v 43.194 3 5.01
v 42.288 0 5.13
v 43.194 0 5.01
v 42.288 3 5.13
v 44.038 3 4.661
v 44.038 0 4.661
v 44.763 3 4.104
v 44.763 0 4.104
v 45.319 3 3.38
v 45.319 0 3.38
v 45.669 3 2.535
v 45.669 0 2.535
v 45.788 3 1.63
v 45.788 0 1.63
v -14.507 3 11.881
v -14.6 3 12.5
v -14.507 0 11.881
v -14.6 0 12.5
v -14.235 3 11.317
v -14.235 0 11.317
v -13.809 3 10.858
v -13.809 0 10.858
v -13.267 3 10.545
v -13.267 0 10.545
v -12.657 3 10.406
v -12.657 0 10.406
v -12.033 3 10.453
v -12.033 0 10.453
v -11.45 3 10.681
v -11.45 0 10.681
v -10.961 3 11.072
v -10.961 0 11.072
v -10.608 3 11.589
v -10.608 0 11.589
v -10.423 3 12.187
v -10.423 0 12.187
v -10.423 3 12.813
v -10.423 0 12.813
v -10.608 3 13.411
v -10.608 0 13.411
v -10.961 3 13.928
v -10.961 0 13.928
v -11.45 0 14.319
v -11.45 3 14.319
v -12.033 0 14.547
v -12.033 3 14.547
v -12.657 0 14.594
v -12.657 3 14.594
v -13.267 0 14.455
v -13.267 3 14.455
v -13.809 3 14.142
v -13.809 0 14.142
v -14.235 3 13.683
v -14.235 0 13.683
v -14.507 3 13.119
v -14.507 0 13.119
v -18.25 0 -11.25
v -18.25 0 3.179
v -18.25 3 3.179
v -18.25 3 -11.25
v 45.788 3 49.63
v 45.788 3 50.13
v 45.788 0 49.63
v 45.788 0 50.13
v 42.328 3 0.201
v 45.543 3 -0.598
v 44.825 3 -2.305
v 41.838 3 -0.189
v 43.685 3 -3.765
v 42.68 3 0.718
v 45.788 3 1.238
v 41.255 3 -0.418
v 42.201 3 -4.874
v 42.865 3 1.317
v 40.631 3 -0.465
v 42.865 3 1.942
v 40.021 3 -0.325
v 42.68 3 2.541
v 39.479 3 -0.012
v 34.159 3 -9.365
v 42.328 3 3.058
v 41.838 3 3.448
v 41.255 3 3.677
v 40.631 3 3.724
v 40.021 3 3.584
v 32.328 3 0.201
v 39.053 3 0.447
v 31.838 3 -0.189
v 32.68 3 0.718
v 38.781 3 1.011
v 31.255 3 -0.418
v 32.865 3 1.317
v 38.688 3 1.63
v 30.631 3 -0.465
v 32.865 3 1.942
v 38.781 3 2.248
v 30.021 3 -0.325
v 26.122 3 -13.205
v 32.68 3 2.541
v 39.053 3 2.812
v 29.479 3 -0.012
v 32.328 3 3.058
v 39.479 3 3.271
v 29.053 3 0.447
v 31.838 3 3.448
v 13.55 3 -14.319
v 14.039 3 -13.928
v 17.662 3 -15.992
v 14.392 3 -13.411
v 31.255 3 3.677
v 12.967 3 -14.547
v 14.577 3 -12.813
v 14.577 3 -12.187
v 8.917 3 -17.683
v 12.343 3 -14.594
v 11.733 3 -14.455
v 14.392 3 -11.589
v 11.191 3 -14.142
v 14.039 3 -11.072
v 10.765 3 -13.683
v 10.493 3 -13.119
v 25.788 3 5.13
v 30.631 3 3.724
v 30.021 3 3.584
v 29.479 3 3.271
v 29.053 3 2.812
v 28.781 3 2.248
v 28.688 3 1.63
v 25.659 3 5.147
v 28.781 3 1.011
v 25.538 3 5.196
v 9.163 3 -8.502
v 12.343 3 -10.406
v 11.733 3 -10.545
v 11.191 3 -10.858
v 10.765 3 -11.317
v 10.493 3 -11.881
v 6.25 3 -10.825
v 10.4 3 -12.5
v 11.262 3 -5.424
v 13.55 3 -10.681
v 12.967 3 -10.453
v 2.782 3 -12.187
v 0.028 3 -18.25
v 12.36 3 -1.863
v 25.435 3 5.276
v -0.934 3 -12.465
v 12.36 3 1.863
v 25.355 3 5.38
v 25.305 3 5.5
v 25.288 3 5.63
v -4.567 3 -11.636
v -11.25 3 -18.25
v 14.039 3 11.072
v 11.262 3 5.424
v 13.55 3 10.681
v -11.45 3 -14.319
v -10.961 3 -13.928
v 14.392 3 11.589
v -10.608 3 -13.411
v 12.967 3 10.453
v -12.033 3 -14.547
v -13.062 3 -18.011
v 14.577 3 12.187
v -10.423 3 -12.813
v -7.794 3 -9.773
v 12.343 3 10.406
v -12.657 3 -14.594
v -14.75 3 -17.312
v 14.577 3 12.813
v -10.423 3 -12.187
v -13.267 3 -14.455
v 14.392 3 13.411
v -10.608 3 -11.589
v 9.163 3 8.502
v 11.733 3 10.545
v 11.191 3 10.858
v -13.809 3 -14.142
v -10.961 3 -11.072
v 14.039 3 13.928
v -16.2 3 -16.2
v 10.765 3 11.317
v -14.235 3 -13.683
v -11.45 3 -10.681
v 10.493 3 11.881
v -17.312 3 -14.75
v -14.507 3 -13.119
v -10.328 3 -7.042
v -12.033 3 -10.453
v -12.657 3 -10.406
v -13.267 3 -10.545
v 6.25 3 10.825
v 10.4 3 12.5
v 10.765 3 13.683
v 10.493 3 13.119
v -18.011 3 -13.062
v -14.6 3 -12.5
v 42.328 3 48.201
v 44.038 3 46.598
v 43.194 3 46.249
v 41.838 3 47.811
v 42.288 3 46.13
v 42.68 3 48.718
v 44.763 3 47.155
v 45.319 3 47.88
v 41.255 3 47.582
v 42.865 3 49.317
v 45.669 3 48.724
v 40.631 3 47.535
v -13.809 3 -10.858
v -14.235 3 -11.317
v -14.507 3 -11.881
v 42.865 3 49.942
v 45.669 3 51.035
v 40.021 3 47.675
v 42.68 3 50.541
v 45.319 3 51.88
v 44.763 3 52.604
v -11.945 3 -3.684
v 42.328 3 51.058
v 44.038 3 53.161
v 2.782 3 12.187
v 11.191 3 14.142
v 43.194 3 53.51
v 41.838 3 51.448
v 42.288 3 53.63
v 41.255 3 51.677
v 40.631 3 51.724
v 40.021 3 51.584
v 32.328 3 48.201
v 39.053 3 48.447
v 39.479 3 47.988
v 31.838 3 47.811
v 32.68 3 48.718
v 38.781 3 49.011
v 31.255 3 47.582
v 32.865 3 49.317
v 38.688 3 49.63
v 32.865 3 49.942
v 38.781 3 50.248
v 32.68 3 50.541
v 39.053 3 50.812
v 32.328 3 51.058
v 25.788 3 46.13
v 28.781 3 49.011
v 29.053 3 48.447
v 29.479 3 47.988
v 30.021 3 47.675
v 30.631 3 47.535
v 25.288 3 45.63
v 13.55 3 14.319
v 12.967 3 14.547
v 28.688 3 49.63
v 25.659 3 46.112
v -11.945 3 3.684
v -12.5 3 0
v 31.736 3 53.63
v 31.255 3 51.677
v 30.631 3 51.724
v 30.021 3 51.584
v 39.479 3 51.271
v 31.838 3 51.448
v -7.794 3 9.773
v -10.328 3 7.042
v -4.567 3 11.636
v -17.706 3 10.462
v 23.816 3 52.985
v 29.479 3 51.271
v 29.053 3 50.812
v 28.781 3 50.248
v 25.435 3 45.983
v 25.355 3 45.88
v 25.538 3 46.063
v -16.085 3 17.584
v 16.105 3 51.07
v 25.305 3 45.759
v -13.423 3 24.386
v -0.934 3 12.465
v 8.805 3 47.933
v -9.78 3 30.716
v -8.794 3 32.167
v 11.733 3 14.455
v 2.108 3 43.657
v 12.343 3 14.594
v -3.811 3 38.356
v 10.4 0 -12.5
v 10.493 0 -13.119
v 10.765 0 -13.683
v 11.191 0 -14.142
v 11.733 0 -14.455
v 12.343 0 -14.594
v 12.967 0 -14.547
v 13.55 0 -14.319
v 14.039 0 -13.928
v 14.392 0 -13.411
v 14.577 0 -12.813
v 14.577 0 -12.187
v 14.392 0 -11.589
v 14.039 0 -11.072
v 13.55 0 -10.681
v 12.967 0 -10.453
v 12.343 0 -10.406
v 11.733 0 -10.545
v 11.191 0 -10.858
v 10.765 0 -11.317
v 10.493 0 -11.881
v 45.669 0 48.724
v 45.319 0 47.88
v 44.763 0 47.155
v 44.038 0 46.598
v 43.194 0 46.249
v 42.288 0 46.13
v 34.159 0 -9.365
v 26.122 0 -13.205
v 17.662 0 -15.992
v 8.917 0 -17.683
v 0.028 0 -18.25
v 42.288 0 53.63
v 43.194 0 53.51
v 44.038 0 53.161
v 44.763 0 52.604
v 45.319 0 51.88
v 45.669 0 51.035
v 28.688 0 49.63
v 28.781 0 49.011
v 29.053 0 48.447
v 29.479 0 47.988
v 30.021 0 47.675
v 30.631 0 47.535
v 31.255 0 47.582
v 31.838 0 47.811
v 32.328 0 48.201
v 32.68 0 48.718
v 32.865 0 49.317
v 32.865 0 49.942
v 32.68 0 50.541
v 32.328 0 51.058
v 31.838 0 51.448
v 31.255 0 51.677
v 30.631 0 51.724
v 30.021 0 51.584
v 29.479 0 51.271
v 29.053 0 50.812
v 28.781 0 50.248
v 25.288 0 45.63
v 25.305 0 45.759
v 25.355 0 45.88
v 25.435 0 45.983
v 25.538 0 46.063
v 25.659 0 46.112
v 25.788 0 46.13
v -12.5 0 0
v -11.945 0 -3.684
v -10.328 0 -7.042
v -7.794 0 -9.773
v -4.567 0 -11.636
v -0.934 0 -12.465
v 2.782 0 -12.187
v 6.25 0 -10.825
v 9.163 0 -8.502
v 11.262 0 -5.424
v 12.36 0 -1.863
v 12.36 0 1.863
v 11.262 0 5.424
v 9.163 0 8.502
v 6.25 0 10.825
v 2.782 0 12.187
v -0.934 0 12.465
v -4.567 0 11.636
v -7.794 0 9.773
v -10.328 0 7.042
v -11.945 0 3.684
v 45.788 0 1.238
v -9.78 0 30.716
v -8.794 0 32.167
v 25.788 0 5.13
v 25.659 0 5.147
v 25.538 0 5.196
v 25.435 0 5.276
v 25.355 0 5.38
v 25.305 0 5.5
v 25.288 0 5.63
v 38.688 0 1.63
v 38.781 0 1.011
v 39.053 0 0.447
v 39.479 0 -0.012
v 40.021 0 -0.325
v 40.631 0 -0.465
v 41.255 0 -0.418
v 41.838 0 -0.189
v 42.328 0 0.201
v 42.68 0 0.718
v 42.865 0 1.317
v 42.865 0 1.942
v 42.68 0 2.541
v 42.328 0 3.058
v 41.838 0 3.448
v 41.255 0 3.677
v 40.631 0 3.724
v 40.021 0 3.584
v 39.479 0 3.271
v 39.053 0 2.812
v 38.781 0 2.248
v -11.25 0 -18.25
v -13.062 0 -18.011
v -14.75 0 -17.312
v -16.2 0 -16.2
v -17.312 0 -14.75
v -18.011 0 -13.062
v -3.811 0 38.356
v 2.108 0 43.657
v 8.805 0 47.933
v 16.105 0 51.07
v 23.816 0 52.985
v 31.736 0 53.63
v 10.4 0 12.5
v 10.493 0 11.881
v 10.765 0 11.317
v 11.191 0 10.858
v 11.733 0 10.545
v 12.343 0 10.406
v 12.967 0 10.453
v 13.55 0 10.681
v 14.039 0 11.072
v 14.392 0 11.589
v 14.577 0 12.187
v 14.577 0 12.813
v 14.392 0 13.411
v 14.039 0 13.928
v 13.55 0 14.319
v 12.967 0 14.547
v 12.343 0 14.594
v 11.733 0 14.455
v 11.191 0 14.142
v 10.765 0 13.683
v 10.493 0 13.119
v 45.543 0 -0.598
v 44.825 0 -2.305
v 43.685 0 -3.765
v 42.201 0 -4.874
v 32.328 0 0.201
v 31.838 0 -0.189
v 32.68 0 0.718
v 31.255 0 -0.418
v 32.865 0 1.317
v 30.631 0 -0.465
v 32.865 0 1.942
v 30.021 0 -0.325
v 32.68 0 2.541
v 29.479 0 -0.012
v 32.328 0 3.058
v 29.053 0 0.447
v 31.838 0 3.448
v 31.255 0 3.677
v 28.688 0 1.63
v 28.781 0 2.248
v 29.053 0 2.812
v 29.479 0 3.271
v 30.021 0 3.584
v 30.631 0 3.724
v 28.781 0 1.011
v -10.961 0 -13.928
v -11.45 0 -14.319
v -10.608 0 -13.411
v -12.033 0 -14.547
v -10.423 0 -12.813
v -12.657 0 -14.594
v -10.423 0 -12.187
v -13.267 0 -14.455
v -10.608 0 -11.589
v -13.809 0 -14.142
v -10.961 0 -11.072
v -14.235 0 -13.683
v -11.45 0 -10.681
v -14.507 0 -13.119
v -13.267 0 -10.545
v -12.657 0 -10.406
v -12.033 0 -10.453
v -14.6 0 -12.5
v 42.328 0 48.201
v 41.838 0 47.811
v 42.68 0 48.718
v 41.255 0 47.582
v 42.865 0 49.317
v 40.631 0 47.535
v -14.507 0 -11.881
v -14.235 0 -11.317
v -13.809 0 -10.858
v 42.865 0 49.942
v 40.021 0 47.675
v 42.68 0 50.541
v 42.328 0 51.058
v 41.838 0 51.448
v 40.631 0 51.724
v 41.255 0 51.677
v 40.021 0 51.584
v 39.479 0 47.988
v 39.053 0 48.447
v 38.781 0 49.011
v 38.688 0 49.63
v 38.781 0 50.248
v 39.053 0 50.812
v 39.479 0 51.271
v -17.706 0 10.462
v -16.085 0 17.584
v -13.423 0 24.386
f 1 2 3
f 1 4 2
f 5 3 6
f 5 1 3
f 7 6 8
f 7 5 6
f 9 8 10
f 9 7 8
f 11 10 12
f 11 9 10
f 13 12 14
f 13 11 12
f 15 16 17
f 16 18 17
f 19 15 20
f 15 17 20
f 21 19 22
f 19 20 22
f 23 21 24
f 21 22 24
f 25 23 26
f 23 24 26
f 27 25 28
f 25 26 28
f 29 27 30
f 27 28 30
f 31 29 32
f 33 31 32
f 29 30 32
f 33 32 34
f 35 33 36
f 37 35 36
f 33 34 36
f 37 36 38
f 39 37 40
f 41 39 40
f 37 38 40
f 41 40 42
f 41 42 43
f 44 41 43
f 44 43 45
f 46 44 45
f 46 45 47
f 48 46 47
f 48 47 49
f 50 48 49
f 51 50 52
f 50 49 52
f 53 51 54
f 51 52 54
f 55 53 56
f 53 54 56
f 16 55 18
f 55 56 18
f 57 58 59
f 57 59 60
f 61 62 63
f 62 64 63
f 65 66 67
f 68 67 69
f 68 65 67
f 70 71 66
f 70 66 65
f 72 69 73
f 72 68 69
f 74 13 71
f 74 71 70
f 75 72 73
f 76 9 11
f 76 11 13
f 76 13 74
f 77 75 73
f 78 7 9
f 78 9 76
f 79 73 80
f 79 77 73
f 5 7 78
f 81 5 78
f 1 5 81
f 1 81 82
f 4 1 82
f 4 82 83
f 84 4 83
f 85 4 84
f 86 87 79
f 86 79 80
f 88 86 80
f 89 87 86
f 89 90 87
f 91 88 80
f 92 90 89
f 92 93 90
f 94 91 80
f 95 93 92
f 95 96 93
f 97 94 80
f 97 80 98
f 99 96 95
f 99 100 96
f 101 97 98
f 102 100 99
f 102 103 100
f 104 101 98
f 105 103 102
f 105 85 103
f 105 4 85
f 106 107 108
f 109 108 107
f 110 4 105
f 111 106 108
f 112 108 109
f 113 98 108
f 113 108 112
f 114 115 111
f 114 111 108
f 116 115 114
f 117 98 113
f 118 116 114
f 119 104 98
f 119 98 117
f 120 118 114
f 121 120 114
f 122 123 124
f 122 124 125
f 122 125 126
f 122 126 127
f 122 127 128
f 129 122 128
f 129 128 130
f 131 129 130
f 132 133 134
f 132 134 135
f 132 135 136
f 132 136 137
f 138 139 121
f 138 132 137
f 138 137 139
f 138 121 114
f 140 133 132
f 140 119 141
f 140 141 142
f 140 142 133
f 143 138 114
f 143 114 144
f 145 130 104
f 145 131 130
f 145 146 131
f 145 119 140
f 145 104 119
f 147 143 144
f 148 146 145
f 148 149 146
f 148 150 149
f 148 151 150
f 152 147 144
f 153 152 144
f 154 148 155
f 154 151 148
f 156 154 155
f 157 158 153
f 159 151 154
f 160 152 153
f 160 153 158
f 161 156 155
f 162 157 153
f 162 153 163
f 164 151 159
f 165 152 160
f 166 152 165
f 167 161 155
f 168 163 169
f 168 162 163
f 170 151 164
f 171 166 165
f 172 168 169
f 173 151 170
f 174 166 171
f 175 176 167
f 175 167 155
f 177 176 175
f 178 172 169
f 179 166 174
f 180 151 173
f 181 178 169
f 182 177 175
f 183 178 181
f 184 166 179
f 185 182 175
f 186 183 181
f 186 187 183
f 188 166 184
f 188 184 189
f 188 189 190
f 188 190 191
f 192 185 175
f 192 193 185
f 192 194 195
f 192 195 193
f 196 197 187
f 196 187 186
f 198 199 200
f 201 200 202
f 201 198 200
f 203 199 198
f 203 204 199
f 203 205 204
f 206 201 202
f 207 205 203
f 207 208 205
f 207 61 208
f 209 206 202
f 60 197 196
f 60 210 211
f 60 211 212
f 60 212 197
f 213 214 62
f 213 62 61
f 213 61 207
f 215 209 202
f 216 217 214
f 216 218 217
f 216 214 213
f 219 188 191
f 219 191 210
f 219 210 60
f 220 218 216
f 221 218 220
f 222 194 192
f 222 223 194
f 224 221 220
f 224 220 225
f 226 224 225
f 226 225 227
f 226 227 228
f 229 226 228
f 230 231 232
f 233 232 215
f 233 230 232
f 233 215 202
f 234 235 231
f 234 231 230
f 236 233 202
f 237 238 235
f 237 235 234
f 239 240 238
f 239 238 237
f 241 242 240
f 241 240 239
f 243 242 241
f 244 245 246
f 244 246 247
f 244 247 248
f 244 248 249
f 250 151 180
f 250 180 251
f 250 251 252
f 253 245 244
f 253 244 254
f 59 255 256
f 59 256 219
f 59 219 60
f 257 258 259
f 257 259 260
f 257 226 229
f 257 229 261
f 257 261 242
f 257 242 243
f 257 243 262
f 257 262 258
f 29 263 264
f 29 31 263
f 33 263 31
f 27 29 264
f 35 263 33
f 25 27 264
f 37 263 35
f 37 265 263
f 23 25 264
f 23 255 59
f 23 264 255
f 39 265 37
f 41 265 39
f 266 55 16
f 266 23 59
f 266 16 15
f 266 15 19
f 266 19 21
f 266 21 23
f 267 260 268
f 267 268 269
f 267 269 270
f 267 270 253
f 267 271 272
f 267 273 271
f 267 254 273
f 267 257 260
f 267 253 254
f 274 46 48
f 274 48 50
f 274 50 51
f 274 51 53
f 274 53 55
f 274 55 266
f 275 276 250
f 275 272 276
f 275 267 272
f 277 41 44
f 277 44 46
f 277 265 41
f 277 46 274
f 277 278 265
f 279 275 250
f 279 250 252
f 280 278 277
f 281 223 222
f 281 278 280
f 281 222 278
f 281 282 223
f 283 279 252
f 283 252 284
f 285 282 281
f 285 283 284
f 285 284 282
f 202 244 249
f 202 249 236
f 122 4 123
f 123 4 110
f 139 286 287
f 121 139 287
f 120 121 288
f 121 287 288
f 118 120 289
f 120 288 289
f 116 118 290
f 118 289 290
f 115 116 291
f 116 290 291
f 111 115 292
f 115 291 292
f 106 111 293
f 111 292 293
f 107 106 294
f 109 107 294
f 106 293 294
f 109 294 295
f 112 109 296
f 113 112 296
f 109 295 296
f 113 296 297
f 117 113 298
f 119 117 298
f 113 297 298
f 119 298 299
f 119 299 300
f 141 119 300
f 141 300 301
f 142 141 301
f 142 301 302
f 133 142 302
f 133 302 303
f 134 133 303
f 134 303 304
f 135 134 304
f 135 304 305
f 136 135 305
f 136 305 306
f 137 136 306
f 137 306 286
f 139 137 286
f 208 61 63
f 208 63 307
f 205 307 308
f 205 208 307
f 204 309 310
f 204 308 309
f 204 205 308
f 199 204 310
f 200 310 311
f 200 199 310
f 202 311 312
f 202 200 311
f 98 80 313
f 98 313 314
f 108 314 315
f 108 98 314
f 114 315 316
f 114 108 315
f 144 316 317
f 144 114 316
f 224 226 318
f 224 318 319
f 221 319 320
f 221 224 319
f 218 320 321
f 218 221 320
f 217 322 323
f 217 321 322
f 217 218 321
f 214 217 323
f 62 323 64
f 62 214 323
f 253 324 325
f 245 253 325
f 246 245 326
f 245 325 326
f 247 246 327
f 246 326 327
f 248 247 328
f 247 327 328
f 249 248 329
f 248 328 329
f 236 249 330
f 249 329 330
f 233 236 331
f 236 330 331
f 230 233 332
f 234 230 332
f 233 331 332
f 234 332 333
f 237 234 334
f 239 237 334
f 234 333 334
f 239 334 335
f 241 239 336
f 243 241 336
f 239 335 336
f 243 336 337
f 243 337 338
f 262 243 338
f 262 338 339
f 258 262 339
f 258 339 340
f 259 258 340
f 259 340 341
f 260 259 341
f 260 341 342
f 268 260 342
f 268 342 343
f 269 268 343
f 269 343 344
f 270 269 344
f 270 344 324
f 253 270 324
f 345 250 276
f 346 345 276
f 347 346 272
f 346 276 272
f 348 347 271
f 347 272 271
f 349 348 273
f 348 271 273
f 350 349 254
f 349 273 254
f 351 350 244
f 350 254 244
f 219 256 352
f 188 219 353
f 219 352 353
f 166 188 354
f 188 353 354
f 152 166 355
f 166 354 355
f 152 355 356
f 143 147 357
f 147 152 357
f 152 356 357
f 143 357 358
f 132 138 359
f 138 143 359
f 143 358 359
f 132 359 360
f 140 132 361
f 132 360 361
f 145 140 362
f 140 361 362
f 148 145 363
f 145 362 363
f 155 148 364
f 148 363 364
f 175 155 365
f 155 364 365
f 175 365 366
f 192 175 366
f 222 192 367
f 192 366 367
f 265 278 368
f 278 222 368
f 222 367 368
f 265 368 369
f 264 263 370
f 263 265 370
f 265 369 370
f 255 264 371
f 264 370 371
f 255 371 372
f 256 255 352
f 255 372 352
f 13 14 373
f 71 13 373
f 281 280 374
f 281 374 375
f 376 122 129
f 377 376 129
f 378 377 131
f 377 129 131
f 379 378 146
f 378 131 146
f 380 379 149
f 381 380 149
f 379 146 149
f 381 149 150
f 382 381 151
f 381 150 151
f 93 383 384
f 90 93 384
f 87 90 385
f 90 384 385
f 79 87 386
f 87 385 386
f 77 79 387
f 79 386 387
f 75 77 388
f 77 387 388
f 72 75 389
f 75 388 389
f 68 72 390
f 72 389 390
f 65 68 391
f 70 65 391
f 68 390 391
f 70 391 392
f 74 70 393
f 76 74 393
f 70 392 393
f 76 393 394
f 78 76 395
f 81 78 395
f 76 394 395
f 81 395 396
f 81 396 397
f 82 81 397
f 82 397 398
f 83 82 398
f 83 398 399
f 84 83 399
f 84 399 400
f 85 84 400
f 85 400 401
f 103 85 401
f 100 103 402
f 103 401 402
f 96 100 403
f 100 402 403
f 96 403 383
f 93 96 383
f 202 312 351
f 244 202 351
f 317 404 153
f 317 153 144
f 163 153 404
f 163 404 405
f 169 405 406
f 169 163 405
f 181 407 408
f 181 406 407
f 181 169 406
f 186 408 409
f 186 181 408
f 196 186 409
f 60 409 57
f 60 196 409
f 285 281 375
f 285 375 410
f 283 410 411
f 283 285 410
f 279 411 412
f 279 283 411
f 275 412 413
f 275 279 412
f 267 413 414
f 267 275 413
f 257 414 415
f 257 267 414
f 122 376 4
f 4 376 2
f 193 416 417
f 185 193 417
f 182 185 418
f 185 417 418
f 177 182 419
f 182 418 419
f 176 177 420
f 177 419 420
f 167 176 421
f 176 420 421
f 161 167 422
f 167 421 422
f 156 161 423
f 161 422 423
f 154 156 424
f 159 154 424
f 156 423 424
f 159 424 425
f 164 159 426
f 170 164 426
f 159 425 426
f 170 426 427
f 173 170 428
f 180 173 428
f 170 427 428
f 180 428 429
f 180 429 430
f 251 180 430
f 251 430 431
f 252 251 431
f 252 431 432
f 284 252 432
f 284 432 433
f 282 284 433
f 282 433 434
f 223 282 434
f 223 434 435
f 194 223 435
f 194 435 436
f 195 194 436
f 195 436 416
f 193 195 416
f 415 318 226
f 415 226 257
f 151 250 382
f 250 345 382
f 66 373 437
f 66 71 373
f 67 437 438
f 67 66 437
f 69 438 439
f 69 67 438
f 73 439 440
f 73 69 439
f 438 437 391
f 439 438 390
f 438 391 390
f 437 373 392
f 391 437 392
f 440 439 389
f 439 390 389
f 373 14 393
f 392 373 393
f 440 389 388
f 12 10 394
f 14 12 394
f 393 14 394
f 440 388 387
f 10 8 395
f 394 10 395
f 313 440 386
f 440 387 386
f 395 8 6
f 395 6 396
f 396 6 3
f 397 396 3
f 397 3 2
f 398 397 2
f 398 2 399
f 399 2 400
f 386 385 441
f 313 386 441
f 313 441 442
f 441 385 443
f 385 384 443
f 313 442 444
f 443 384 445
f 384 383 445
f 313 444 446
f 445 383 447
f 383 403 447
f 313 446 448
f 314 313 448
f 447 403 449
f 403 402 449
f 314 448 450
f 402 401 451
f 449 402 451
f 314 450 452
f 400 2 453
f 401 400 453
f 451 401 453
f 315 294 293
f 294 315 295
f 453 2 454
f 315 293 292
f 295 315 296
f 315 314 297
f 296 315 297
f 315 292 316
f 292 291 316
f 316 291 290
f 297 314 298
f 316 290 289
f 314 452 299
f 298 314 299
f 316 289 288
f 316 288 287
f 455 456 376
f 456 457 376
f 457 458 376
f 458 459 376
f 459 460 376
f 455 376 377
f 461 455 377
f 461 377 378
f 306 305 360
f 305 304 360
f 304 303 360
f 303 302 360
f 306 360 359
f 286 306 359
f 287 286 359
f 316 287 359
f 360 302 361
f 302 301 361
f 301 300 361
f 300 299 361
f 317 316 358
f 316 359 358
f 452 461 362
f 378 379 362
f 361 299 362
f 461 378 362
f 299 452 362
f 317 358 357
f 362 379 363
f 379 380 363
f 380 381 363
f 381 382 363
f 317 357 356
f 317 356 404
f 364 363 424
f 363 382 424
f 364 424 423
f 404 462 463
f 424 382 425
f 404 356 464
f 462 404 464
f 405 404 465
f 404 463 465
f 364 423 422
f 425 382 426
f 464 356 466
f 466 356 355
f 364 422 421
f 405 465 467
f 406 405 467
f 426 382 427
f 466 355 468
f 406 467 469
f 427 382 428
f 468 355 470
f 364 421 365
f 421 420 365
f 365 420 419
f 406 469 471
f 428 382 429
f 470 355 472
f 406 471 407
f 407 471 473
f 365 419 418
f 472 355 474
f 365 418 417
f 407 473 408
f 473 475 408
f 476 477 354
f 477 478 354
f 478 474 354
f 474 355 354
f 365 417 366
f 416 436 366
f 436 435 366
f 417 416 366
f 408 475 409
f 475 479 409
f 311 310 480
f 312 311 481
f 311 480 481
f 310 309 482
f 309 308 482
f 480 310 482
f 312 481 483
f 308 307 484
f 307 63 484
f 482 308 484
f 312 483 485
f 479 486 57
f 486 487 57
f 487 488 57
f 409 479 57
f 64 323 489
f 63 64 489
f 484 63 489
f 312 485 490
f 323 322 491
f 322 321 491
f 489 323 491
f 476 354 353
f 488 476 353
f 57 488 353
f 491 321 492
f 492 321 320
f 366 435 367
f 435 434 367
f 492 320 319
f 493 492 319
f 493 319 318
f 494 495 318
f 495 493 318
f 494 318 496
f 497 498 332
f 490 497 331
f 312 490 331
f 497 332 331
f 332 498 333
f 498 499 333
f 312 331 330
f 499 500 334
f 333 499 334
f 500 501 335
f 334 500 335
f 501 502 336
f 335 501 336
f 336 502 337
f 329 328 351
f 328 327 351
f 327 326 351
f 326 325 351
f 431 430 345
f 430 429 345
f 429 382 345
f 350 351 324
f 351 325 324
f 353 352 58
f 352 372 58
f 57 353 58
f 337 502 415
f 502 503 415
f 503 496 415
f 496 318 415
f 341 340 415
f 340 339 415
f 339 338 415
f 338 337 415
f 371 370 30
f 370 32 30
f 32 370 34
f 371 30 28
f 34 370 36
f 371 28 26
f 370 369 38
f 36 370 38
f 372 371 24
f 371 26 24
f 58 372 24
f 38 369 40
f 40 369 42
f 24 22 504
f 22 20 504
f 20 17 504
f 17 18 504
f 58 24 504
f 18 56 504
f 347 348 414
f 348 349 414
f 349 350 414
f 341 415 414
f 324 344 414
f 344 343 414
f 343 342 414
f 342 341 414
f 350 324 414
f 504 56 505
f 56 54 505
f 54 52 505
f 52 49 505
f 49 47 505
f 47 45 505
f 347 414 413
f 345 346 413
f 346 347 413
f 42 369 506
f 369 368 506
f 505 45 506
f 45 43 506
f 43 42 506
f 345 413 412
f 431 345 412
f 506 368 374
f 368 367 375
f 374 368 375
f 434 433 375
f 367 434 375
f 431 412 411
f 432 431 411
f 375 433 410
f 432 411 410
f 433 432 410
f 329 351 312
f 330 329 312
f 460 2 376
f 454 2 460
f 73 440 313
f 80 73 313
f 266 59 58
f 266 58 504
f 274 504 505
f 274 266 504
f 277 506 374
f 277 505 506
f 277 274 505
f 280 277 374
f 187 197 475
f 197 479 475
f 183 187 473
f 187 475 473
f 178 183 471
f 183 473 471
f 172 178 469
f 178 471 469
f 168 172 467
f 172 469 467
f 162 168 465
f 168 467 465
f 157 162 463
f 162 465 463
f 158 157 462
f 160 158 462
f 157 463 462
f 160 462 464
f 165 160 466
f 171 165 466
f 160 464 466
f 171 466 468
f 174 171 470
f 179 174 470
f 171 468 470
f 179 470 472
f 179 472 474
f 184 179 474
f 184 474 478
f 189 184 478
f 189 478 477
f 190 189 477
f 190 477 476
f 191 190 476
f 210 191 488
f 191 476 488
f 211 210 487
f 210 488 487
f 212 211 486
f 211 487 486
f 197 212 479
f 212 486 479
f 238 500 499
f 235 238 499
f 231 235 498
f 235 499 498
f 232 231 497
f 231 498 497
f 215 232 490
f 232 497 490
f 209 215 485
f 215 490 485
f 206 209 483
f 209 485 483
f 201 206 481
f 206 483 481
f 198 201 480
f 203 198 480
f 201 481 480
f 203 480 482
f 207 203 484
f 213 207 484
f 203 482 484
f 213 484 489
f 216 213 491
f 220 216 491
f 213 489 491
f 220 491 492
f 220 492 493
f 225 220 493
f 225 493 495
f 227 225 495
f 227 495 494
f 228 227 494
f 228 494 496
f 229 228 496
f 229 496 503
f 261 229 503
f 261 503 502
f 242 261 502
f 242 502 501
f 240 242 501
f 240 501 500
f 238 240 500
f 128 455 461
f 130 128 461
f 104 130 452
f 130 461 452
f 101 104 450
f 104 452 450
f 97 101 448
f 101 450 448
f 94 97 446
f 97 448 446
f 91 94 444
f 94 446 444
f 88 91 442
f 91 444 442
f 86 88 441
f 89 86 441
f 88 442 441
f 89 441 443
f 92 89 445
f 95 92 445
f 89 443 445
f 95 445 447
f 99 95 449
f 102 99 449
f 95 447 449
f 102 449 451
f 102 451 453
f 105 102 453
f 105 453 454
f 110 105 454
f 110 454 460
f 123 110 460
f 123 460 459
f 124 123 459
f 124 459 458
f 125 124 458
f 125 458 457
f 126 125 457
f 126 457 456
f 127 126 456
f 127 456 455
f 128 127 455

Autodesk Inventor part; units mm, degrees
ref_plane "YZ Plane" through (0, 0, 0) normal (1, 0, 0) x (0, 1, 0)
ref_plane "XZ Plane" through (0, 0, 0) normal (0, 1, 0) x (-1, 0, 0)
ref_plane "XY Plane" through (0, 0, 0) normal (0, 0, 1) x (1, 0, 0)
sketch "Szkic1" plane through (0, 0, 0) normal (0, 1, 0) x (-1, 0, 0)
  circle A0 centre (0, 0) radius 12.5
  line L0 (-12.5, 12.5) -> (12.5, 12.5)
  line L1 (12.5, 12.5) -> (12.5, -12.5)
  line L2 (12.5, -12.5) -> (-12.5, -12.5)
  line L3 (-12.5, -12.5) -> (-12.5, 12.5)
  line L4 (-12.5, 12.5) -> (12.5, -12.5) construction
  line L5 (12.5, 12.5) -> (-12.5, -12.5) construction
  circle A1 centre (12.5, -12.5) radius 2.1
  circle A2 centre (-12.5, -12.5) radius 2.1
  circle A3 centre (-12.5, 12.5) radius 2.1
  circle A4 centre (12.5, 12.5) radius 2.1
  circle A5 centre (0, 0) radius 50.5
  line L6 (-25, 3.4426) -> (25, 3.4426)
  line L7 (25, 3.4426) -> (25, -3.4426)
  line L8 (25, -3.4426) -> (-25, -3.4426)
  line L9 (-25, -3.4426) -> (-25, 3.4426)
  line L10 (-25, 3.4426) -> (25, -3.4426) construction
  line L11 (25, 3.4426) -> (-25, -3.4426) construction
  circle A6 centre (-35.7881, 35.6295) radius 3
  line L12 (-35.7881, 38.6295) -> (-35.7881, 45.6295)
  line L13 (-35.7881, 32.6295) -> (-35.7881, 5.6295)
  line L14 (-35.7881, 5.6295) -> (-35.7881, 25.6295)
  line L15 (-45.7881, 45.6295) -> (-25.7881, 45.6295)
  line L16 (-25.7881, 45.6295) -> (-25.7881, 5.6295)
  line L17 (-25.7881, 5.6295) -> (-45.7881, 5.6295)
  line L18 (-45.7881, 5.6295) -> (-45.7881, 45.6295)
  line L19 (-45.7881, 45.6295) -> (-25.7881, 5.6295) construction
  line L20 (-25.7881, 45.6295) -> (-45.7881, 5.6295) construction
  line L21 (-40.7881, 49.6295) -> (-30.7881, 49.6295)
  line L22 (-30.7881, 49.6295) -> (-30.7881, 1.6295)
  line L23 (-30.7881, 1.6295) -> (-40.7881, 1.6295)
  line L24 (-40.7881, 1.6295) -> (-40.7881, 49.6295)
  line L25 (-40.7881, 49.6295) -> (-30.7881, 1.6295) construction
  line L26 (-30.7881, 49.6295) -> (-40.7881, 1.6295) construction
  circle A7 centre (-30.7881, 1.6295) radius 2.1
  circle A8 centre (-40.7881, 1.6295) radius 2.1
  circle A9 centre (-40.7881, 49.6295) radius 2.1
  circle A10 centre (-30.7881, 49.6295) radius 2.1
  line L27 (-46.2881, 46.1295) -> (-25.2881, 46.1295)
  line L28 (-25.2881, 46.1295) -> (-25.2881, 5.1295)
  line L29 (-25.2881, 5.1295) -> (-46.2881, 5.1295)
  line L30 (-46.2881, 5.1295) -> (-46.2881, 46.1295)
  line L31 (-46.2881, 46.1295) -> (-25.2881, 5.1295) construction
  line L32 (-25.2881, 46.1295) -> (-46.2881, 5.1295) construction
  line L33 (-35.7881, 45.6295) -> (-35.7881, 53.6295)
  line L34 (-35.7881, 53.6295) -> (-45.7881, 53.6295)
  line L35 (-45.7881, 53.6295) -> (-45.7881, 46.1295)
  line L36 (-35.7881, 53.6295) -> (-5.7881, 53.6295)
  line L37 (-18.25, 18.25) -> (18.25, 18.25)
  line L38 (18.25, 18.25) -> (18.25, -18.25)
  line L39 (18.25, -18.25) -> (-18.25, -18.25)
  line L40 (-18.25, -18.25) -> (-18.25, 18.25)
  line L41 (-18.25, 18.25) -> (18.25, -18.25) construction
  line L42 (18.25, 18.25) -> (-18.25, -18.25) construction
  line L43 (18.25, 18.25) -> (-5.7881, 53.6295)
  line L44 (-45.7881, 5.1295) -> (-45.7881, -2.8705)
  line L45 (-45.7881, -2.8705) -> (-18.25, -18.25)
  dimension "d9" = 101
  dimension "d0" = 25
  dimension "d1" = 25
  dimension "d2" = 25
  dimension "d3" = 4.2
  dimension "d4" = 4.2
  dimension "d5" = 4.2
  dimension "d6" = 4.2
  dimension "d13" = 50
  dimension "d17" = 6
  dimension "d18" = 7
  dimension "d19" = 27
  dimension "d20" = 20
  dimension "d21" = 20
  dimension "d22" = 40
  dimension "d23" = 10
  dimension "d24" = 48
  dimension "d25" = 4.2
  dimension "d26" = 4.2
  dimension "d27" = 4.2
  dimension "d28" = 4.2
  dimension "d29" = 21
  dimension "d30" = 41
  dimension "d31" = 8
  dimension "d32" = 10
  dimension "d33" = 30
  dimension "d34" = 36.5
  dimension "d35" = 36.5
  dimension "d36" = 8
extrude "Wyciągnięcie proste1" add sketch "Szkic1" along normal blind 3 contours L1 L8 A0 | A0 L6 L1 | L1 L6 L38 L8 | A0 L0 A4 L1 L6 | L8 L1 A1 L2 A0 | L1 A4 L0 A3 L3 L6 L40 L37 L38 | L8 L38 L39 L40 L3 A2 L2 A1 L1 | A0 L6 L3 A3 L0 | A0 L3 L6 | L2 A2 L3 L8 A0 | L8 L3 A0 | L3 L8 L40 L6 | L37 L40 L6 L9 L8 L45 L44 L29 L24 A8 L23 A7 L22 L28 A5 L43 | L40 L8 L9 L6 | A5 L28 L27 L22 A10 L21 L33 L36 L43 | L33 L21 A9 L24 L27 L35 L34 | L27 L33 L21 A10 L22 | L22 A7 L23 A8 L24 L29 | L33 L27 L24 A9 L21
fillet "Zaokrąglenie1" radius 0.5 2 edges at (25.2881, 1.5, 5.1295) (25.2881, 1.5, 46.1295)
fillet "Zaokrąglenie3" radius 3.5 3 edges at (45.7881, 1.5, 5.1295) (45.7881, 1.5, 46.1295) (45.7881, 1.5, 53.6295)
fillet "Zaokrąglenie4" radius 7 1 edges at (45.7881, 1.5, -2.8705)
fillet "Zaokrąglenie5" radius 70 1 edges at (18.25, 1.5, -18.25)
fillet "Zaokrąglenie6" radius 49 1 edges at (5.7881, 1.5, 53.6295)
fillet "Zaokrąglenie7" radius 49 1 edges at (-18.25, 1.5, 18.25)
fillet "Zaokrąglenie8" radius 7 1 edges at (-18.25, 1.5, -18.25)
properties part number "plyka zawor servo"
